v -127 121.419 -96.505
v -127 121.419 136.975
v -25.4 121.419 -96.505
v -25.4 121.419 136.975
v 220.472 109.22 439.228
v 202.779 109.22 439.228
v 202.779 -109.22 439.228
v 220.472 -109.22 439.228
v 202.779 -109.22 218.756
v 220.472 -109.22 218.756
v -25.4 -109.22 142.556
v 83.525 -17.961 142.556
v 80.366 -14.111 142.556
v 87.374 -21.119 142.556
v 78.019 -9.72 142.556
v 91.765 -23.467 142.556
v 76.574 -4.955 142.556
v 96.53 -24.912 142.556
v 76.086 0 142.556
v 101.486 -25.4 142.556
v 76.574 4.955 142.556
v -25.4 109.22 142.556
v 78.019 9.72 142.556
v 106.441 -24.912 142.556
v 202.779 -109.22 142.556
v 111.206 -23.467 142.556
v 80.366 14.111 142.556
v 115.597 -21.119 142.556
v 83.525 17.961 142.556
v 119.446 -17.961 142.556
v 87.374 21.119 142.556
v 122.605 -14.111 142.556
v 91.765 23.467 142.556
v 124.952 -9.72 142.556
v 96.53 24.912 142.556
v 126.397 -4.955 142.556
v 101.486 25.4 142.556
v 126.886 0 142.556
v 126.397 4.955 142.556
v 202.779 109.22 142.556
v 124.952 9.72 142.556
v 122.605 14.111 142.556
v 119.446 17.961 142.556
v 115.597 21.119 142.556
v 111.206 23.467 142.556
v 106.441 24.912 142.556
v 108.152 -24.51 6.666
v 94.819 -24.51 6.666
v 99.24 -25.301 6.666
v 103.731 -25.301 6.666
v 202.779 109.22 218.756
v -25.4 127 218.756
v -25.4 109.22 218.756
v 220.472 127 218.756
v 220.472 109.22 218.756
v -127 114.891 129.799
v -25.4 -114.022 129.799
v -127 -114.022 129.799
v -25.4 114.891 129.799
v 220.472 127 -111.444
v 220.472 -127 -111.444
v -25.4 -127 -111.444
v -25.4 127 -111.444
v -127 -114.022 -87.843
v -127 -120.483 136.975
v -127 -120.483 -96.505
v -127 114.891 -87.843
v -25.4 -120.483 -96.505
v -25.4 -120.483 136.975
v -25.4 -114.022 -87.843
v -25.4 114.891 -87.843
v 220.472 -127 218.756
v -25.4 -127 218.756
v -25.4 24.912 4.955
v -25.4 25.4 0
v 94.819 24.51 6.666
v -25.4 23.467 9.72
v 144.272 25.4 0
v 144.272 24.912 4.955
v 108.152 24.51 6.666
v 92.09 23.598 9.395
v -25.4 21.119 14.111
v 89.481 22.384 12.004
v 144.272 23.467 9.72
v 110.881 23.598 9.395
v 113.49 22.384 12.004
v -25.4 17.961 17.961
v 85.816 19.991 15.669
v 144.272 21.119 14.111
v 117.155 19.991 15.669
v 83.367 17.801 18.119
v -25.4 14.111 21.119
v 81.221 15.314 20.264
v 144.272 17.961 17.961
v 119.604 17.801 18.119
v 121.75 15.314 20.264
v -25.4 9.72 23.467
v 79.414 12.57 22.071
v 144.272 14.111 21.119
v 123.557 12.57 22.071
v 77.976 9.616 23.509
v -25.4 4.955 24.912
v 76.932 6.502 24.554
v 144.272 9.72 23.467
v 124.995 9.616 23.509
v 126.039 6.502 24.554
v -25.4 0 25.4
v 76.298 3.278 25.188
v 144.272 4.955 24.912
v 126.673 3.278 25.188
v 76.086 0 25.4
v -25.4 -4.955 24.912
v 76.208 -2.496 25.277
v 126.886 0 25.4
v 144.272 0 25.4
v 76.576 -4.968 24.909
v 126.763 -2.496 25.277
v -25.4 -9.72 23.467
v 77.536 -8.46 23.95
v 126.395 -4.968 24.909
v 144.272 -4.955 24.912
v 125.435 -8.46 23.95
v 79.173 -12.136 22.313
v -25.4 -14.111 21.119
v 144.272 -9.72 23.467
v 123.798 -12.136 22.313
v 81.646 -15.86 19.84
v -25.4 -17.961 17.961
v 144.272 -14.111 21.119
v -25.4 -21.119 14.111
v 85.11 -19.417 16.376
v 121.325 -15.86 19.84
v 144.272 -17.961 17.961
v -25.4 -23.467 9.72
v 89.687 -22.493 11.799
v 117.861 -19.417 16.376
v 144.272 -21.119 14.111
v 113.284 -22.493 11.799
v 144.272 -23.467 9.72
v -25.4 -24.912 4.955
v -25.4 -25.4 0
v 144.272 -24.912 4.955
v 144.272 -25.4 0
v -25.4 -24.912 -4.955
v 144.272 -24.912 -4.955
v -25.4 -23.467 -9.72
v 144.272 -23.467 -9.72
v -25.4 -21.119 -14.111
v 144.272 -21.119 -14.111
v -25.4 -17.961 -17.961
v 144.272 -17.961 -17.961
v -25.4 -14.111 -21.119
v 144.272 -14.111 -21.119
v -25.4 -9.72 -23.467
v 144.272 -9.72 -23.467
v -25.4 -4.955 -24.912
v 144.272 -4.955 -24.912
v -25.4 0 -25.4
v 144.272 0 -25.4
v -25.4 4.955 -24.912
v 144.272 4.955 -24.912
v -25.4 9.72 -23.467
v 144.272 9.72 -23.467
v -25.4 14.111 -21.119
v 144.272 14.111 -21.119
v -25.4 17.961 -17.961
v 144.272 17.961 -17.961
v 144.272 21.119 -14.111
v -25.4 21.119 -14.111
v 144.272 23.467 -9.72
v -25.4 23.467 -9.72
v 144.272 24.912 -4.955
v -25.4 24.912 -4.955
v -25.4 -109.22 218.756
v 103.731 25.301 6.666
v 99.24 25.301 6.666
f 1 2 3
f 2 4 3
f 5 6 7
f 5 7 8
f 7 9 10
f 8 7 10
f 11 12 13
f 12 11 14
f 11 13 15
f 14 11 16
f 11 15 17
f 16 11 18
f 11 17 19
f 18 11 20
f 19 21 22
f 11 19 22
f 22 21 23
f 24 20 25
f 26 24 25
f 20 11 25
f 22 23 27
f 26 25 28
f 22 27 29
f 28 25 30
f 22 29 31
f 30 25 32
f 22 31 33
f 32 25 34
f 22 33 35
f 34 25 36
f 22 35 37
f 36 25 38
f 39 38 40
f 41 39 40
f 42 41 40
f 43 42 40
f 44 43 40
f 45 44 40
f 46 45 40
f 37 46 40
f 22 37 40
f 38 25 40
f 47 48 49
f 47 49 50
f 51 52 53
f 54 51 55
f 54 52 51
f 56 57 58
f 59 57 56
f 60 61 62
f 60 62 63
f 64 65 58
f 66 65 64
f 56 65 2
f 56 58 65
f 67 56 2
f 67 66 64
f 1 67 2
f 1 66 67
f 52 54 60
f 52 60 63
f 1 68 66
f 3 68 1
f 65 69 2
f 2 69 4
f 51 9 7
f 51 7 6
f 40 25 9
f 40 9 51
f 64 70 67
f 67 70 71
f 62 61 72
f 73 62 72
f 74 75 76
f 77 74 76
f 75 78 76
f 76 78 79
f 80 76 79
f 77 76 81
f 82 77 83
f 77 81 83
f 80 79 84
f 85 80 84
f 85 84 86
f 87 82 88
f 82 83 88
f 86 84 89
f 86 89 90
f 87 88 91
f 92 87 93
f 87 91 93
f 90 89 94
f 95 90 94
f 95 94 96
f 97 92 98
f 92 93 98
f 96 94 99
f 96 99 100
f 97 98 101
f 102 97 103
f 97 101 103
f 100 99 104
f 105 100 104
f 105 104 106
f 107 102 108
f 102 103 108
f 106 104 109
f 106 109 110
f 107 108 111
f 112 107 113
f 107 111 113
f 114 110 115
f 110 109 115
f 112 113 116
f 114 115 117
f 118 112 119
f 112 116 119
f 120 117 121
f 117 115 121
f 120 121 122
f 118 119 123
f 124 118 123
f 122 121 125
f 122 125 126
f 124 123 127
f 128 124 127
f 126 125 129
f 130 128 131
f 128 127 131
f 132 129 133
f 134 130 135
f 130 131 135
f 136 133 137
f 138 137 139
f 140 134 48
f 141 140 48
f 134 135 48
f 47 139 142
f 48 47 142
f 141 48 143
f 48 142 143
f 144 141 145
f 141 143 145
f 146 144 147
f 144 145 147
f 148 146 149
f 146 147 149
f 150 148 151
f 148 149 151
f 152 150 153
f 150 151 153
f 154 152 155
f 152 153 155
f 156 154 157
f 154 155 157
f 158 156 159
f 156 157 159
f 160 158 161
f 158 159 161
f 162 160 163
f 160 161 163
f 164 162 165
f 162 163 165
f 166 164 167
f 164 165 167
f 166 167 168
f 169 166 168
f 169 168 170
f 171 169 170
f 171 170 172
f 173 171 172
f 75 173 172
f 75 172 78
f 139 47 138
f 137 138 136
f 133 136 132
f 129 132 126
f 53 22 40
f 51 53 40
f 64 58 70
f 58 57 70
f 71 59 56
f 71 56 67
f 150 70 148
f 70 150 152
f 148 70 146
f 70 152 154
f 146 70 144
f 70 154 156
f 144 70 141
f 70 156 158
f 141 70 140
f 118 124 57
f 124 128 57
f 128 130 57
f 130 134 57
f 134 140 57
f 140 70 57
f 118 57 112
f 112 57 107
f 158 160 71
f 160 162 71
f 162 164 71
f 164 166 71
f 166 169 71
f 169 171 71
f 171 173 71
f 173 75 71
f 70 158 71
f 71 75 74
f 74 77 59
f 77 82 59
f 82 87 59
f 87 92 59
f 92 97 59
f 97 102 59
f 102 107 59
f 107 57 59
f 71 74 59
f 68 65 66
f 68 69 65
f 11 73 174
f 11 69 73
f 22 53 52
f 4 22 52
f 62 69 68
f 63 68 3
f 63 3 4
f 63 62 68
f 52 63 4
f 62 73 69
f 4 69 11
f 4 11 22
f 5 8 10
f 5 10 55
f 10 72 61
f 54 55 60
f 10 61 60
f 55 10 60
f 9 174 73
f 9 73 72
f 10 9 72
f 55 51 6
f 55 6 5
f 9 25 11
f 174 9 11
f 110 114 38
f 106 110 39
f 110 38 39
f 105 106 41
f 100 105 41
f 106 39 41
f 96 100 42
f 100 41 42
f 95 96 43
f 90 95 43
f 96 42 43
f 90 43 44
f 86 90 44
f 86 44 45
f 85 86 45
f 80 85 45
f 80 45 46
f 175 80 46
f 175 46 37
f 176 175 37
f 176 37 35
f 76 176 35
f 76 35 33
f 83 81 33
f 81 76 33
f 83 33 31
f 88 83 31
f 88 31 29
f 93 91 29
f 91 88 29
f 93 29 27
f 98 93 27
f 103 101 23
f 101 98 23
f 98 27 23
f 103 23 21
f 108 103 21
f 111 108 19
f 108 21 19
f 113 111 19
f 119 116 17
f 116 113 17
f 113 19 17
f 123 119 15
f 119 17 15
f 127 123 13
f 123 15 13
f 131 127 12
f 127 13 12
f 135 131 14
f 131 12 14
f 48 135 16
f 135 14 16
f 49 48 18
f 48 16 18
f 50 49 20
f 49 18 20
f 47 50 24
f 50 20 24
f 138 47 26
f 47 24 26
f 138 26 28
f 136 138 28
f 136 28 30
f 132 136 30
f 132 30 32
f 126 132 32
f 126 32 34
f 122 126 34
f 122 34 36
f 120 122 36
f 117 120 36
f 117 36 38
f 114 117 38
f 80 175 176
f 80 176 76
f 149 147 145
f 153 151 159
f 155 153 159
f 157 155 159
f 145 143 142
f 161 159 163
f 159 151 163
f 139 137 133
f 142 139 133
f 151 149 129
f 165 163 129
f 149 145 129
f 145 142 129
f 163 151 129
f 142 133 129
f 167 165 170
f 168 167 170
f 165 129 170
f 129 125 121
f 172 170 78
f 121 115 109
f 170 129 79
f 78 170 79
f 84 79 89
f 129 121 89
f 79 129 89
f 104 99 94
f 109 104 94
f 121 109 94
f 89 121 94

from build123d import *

# Parameters (mm, degrees)
F0_W        = 254
F0_H        = 254
F0_R        = 25.4
F1_DEPTH    = 220.472
F2_DEPTH    = 144.272
F3_R        = 25.4
F4_DEPTH    = 135.89
F5_W        = 241.9015839696
F5_H        = 233.4794849157
F5_W_2      = 228.9127036929
F5_H_2      = 217.6413685083
F6_DEPTH    = 101.6
F6_FACE_W   = 241.9015839696
F6_FACE_H   = 233.4794849157
F6_FACE_W_2 = 228.9127036929
F6_FACE_H_2 = 217.6413685083
F7_DEPTH    = 25.4
F8_W        = 228.178890729
F8_H        = 17.78
F8_W_2      = 17.693109271
F9_DEPTH    = 76.2
F8_H_2      = 218.44
F10_DEPTH   = 296.672


with BuildPart() as f1:
    # F0 (on Right) → F1 (new body)
    with BuildSketch(Plane.YZ):
        with Locations((0, 15.5562520722)):
            Rectangle(F0_W, F0_H)
        Circle(F0_R, mode=Mode.SUBTRACT)
        Circle(F0_R)
    extrude(amount=F1_DEPTH)

    # F0 (on Right) → F2 (cut)
    with BuildSketch(Plane.YZ):
        Circle(F0_R)
    extrude(amount=F2_DEPTH, mode=Mode.SUBTRACT)

    # F3 (on face) → F4 (cut)
    with BuildSketch(Plane.XY.offset(142.5562520722)):
        with Locations((101.4855039687, 0)):
            Circle(F3_R)
    extrude(amount=-F4_DEPTH, mode=Mode.SUBTRACT)

    # F5 (on face) → F6 (join)
    with BuildSketch(Plane.YZ):
        with Locations((0.4678927362, 20.2352032065)):
            Rectangle(F5_W, F5_H)
        with Locations((0.4346482456, 20.9778919816)):
            Rectangle(F5_W_2, F5_H_2, mode=Mode.SUBTRACT)
    extrude(amount=-F6_DEPTH)

    # F6_face (on face) + F0 (on Right) → F7 (join)
    with BuildSketch(Plane(origin=(-101.6, 0.7166497245, 14.6779207971), x_dir=(0, 1, 0), z_dir=(-1, 0, 0))):
        with Locations((-0.2487569883, -5.5572824094)):
            Rectangle(F6_FACE_W, F6_FACE_H)
        with Locations((-0.282001479, -6.2999711845)):
            Rectangle(F6_FACE_W_2, F6_FACE_H_2, mode=Mode.SUBTRACT)
    with BuildSketch(Plane.YZ):
        with Locations((0, 15.5562520722)):
            Rectangle(F0_W, F0_H)
        Circle(F0_R, mode=Mode.SUBTRACT)
    extrude(amount=F7_DEPTH, dir=(-1, 0, 0))

    # F8 (on face) → F9 (join)
    with BuildSketch(Plane.XY.offset(142.5562520722)):
        with Locations((88.6894453645, 118.11)):
            Rectangle(F8_W, F8_H)
        with Locations((211.6254453645, 118.11)):
            Rectangle(F8_W_2, F8_H)
        with Locations((88.6894453645, -118.11)):
            Rectangle(F8_W, F8_H)
        with Locations((211.6254453645, -118.11)):
            Rectangle(F8_W_2, F8_H)
    extrude(amount=F9_DEPTH)

    # F8 (on face) → F10 (join)
    with BuildSketch(Plane.XY.offset(142.5562520722)):
        with Locations((211.6254453645, 0)):
            Rectangle(F8_W_2, F8_H_2)
    extrude(amount=F10_DEPTH)


solid = f1.part
